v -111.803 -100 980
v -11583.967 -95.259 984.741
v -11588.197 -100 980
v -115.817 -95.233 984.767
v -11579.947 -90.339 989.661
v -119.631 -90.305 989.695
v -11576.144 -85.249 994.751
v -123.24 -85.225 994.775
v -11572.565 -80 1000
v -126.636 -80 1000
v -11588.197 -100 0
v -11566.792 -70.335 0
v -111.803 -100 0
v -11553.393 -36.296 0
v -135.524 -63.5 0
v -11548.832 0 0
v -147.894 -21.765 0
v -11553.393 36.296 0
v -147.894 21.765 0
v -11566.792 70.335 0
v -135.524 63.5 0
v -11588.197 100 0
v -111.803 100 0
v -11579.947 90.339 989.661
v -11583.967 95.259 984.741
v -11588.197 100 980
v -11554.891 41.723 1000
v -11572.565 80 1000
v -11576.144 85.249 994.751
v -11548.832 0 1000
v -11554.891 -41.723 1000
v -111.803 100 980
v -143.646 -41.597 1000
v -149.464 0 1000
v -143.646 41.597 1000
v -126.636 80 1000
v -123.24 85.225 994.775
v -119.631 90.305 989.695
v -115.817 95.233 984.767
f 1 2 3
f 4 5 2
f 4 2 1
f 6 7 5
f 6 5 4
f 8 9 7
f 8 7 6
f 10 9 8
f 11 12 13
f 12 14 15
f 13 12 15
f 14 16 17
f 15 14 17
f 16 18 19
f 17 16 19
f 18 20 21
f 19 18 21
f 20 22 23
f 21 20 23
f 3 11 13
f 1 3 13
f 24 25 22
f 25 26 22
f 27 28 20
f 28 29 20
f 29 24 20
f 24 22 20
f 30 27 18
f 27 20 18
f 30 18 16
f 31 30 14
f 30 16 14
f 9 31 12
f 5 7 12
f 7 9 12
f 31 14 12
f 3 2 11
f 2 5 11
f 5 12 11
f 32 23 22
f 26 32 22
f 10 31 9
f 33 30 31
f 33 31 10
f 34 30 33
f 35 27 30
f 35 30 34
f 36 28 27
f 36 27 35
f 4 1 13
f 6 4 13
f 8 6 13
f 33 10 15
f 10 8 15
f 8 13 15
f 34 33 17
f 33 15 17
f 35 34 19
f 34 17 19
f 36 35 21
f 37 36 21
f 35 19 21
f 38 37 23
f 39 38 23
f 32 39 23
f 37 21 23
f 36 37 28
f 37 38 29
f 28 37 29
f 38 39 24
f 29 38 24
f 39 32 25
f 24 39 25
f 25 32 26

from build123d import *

# Parameters (mm, degrees)
F1_DEPTH = 1000
F2_SIZE  = 20
F3_SIZE  = 20


with BuildPart() as f1:
    # F0 (on Top) → F1 (new body)
    with BuildSketch(Plane.XY):
        with BuildLine():
            ThreePointArc((-111.803399, -100), (-149.464163, 0), (-111.803399, 100))
            Line((-111.803399, 100), (-11588.196601, 100))
            ThreePointArc((-11588.196601, 100), (-11548.832228, 0), (-11588.196601, -100))
            Line((-11588.196601, -100), (-111.803399, -100))
        make_face()
    extrude(amount=F1_DEPTH)

    # F2
    f2_edges = [f1.edges().sort_by_distance(p)[0] for p in [
        (-5850, -100, 1000),
    ]]
    chamfer(f2_edges, length=F2_SIZE)

    # F3
    f3_edges = [f1.edges().sort_by_distance(p)[0] for p in [
        (-5850, 100, 1000),
    ]]
    chamfer(f3_edges, length=F3_SIZE)


solid = f1.part
